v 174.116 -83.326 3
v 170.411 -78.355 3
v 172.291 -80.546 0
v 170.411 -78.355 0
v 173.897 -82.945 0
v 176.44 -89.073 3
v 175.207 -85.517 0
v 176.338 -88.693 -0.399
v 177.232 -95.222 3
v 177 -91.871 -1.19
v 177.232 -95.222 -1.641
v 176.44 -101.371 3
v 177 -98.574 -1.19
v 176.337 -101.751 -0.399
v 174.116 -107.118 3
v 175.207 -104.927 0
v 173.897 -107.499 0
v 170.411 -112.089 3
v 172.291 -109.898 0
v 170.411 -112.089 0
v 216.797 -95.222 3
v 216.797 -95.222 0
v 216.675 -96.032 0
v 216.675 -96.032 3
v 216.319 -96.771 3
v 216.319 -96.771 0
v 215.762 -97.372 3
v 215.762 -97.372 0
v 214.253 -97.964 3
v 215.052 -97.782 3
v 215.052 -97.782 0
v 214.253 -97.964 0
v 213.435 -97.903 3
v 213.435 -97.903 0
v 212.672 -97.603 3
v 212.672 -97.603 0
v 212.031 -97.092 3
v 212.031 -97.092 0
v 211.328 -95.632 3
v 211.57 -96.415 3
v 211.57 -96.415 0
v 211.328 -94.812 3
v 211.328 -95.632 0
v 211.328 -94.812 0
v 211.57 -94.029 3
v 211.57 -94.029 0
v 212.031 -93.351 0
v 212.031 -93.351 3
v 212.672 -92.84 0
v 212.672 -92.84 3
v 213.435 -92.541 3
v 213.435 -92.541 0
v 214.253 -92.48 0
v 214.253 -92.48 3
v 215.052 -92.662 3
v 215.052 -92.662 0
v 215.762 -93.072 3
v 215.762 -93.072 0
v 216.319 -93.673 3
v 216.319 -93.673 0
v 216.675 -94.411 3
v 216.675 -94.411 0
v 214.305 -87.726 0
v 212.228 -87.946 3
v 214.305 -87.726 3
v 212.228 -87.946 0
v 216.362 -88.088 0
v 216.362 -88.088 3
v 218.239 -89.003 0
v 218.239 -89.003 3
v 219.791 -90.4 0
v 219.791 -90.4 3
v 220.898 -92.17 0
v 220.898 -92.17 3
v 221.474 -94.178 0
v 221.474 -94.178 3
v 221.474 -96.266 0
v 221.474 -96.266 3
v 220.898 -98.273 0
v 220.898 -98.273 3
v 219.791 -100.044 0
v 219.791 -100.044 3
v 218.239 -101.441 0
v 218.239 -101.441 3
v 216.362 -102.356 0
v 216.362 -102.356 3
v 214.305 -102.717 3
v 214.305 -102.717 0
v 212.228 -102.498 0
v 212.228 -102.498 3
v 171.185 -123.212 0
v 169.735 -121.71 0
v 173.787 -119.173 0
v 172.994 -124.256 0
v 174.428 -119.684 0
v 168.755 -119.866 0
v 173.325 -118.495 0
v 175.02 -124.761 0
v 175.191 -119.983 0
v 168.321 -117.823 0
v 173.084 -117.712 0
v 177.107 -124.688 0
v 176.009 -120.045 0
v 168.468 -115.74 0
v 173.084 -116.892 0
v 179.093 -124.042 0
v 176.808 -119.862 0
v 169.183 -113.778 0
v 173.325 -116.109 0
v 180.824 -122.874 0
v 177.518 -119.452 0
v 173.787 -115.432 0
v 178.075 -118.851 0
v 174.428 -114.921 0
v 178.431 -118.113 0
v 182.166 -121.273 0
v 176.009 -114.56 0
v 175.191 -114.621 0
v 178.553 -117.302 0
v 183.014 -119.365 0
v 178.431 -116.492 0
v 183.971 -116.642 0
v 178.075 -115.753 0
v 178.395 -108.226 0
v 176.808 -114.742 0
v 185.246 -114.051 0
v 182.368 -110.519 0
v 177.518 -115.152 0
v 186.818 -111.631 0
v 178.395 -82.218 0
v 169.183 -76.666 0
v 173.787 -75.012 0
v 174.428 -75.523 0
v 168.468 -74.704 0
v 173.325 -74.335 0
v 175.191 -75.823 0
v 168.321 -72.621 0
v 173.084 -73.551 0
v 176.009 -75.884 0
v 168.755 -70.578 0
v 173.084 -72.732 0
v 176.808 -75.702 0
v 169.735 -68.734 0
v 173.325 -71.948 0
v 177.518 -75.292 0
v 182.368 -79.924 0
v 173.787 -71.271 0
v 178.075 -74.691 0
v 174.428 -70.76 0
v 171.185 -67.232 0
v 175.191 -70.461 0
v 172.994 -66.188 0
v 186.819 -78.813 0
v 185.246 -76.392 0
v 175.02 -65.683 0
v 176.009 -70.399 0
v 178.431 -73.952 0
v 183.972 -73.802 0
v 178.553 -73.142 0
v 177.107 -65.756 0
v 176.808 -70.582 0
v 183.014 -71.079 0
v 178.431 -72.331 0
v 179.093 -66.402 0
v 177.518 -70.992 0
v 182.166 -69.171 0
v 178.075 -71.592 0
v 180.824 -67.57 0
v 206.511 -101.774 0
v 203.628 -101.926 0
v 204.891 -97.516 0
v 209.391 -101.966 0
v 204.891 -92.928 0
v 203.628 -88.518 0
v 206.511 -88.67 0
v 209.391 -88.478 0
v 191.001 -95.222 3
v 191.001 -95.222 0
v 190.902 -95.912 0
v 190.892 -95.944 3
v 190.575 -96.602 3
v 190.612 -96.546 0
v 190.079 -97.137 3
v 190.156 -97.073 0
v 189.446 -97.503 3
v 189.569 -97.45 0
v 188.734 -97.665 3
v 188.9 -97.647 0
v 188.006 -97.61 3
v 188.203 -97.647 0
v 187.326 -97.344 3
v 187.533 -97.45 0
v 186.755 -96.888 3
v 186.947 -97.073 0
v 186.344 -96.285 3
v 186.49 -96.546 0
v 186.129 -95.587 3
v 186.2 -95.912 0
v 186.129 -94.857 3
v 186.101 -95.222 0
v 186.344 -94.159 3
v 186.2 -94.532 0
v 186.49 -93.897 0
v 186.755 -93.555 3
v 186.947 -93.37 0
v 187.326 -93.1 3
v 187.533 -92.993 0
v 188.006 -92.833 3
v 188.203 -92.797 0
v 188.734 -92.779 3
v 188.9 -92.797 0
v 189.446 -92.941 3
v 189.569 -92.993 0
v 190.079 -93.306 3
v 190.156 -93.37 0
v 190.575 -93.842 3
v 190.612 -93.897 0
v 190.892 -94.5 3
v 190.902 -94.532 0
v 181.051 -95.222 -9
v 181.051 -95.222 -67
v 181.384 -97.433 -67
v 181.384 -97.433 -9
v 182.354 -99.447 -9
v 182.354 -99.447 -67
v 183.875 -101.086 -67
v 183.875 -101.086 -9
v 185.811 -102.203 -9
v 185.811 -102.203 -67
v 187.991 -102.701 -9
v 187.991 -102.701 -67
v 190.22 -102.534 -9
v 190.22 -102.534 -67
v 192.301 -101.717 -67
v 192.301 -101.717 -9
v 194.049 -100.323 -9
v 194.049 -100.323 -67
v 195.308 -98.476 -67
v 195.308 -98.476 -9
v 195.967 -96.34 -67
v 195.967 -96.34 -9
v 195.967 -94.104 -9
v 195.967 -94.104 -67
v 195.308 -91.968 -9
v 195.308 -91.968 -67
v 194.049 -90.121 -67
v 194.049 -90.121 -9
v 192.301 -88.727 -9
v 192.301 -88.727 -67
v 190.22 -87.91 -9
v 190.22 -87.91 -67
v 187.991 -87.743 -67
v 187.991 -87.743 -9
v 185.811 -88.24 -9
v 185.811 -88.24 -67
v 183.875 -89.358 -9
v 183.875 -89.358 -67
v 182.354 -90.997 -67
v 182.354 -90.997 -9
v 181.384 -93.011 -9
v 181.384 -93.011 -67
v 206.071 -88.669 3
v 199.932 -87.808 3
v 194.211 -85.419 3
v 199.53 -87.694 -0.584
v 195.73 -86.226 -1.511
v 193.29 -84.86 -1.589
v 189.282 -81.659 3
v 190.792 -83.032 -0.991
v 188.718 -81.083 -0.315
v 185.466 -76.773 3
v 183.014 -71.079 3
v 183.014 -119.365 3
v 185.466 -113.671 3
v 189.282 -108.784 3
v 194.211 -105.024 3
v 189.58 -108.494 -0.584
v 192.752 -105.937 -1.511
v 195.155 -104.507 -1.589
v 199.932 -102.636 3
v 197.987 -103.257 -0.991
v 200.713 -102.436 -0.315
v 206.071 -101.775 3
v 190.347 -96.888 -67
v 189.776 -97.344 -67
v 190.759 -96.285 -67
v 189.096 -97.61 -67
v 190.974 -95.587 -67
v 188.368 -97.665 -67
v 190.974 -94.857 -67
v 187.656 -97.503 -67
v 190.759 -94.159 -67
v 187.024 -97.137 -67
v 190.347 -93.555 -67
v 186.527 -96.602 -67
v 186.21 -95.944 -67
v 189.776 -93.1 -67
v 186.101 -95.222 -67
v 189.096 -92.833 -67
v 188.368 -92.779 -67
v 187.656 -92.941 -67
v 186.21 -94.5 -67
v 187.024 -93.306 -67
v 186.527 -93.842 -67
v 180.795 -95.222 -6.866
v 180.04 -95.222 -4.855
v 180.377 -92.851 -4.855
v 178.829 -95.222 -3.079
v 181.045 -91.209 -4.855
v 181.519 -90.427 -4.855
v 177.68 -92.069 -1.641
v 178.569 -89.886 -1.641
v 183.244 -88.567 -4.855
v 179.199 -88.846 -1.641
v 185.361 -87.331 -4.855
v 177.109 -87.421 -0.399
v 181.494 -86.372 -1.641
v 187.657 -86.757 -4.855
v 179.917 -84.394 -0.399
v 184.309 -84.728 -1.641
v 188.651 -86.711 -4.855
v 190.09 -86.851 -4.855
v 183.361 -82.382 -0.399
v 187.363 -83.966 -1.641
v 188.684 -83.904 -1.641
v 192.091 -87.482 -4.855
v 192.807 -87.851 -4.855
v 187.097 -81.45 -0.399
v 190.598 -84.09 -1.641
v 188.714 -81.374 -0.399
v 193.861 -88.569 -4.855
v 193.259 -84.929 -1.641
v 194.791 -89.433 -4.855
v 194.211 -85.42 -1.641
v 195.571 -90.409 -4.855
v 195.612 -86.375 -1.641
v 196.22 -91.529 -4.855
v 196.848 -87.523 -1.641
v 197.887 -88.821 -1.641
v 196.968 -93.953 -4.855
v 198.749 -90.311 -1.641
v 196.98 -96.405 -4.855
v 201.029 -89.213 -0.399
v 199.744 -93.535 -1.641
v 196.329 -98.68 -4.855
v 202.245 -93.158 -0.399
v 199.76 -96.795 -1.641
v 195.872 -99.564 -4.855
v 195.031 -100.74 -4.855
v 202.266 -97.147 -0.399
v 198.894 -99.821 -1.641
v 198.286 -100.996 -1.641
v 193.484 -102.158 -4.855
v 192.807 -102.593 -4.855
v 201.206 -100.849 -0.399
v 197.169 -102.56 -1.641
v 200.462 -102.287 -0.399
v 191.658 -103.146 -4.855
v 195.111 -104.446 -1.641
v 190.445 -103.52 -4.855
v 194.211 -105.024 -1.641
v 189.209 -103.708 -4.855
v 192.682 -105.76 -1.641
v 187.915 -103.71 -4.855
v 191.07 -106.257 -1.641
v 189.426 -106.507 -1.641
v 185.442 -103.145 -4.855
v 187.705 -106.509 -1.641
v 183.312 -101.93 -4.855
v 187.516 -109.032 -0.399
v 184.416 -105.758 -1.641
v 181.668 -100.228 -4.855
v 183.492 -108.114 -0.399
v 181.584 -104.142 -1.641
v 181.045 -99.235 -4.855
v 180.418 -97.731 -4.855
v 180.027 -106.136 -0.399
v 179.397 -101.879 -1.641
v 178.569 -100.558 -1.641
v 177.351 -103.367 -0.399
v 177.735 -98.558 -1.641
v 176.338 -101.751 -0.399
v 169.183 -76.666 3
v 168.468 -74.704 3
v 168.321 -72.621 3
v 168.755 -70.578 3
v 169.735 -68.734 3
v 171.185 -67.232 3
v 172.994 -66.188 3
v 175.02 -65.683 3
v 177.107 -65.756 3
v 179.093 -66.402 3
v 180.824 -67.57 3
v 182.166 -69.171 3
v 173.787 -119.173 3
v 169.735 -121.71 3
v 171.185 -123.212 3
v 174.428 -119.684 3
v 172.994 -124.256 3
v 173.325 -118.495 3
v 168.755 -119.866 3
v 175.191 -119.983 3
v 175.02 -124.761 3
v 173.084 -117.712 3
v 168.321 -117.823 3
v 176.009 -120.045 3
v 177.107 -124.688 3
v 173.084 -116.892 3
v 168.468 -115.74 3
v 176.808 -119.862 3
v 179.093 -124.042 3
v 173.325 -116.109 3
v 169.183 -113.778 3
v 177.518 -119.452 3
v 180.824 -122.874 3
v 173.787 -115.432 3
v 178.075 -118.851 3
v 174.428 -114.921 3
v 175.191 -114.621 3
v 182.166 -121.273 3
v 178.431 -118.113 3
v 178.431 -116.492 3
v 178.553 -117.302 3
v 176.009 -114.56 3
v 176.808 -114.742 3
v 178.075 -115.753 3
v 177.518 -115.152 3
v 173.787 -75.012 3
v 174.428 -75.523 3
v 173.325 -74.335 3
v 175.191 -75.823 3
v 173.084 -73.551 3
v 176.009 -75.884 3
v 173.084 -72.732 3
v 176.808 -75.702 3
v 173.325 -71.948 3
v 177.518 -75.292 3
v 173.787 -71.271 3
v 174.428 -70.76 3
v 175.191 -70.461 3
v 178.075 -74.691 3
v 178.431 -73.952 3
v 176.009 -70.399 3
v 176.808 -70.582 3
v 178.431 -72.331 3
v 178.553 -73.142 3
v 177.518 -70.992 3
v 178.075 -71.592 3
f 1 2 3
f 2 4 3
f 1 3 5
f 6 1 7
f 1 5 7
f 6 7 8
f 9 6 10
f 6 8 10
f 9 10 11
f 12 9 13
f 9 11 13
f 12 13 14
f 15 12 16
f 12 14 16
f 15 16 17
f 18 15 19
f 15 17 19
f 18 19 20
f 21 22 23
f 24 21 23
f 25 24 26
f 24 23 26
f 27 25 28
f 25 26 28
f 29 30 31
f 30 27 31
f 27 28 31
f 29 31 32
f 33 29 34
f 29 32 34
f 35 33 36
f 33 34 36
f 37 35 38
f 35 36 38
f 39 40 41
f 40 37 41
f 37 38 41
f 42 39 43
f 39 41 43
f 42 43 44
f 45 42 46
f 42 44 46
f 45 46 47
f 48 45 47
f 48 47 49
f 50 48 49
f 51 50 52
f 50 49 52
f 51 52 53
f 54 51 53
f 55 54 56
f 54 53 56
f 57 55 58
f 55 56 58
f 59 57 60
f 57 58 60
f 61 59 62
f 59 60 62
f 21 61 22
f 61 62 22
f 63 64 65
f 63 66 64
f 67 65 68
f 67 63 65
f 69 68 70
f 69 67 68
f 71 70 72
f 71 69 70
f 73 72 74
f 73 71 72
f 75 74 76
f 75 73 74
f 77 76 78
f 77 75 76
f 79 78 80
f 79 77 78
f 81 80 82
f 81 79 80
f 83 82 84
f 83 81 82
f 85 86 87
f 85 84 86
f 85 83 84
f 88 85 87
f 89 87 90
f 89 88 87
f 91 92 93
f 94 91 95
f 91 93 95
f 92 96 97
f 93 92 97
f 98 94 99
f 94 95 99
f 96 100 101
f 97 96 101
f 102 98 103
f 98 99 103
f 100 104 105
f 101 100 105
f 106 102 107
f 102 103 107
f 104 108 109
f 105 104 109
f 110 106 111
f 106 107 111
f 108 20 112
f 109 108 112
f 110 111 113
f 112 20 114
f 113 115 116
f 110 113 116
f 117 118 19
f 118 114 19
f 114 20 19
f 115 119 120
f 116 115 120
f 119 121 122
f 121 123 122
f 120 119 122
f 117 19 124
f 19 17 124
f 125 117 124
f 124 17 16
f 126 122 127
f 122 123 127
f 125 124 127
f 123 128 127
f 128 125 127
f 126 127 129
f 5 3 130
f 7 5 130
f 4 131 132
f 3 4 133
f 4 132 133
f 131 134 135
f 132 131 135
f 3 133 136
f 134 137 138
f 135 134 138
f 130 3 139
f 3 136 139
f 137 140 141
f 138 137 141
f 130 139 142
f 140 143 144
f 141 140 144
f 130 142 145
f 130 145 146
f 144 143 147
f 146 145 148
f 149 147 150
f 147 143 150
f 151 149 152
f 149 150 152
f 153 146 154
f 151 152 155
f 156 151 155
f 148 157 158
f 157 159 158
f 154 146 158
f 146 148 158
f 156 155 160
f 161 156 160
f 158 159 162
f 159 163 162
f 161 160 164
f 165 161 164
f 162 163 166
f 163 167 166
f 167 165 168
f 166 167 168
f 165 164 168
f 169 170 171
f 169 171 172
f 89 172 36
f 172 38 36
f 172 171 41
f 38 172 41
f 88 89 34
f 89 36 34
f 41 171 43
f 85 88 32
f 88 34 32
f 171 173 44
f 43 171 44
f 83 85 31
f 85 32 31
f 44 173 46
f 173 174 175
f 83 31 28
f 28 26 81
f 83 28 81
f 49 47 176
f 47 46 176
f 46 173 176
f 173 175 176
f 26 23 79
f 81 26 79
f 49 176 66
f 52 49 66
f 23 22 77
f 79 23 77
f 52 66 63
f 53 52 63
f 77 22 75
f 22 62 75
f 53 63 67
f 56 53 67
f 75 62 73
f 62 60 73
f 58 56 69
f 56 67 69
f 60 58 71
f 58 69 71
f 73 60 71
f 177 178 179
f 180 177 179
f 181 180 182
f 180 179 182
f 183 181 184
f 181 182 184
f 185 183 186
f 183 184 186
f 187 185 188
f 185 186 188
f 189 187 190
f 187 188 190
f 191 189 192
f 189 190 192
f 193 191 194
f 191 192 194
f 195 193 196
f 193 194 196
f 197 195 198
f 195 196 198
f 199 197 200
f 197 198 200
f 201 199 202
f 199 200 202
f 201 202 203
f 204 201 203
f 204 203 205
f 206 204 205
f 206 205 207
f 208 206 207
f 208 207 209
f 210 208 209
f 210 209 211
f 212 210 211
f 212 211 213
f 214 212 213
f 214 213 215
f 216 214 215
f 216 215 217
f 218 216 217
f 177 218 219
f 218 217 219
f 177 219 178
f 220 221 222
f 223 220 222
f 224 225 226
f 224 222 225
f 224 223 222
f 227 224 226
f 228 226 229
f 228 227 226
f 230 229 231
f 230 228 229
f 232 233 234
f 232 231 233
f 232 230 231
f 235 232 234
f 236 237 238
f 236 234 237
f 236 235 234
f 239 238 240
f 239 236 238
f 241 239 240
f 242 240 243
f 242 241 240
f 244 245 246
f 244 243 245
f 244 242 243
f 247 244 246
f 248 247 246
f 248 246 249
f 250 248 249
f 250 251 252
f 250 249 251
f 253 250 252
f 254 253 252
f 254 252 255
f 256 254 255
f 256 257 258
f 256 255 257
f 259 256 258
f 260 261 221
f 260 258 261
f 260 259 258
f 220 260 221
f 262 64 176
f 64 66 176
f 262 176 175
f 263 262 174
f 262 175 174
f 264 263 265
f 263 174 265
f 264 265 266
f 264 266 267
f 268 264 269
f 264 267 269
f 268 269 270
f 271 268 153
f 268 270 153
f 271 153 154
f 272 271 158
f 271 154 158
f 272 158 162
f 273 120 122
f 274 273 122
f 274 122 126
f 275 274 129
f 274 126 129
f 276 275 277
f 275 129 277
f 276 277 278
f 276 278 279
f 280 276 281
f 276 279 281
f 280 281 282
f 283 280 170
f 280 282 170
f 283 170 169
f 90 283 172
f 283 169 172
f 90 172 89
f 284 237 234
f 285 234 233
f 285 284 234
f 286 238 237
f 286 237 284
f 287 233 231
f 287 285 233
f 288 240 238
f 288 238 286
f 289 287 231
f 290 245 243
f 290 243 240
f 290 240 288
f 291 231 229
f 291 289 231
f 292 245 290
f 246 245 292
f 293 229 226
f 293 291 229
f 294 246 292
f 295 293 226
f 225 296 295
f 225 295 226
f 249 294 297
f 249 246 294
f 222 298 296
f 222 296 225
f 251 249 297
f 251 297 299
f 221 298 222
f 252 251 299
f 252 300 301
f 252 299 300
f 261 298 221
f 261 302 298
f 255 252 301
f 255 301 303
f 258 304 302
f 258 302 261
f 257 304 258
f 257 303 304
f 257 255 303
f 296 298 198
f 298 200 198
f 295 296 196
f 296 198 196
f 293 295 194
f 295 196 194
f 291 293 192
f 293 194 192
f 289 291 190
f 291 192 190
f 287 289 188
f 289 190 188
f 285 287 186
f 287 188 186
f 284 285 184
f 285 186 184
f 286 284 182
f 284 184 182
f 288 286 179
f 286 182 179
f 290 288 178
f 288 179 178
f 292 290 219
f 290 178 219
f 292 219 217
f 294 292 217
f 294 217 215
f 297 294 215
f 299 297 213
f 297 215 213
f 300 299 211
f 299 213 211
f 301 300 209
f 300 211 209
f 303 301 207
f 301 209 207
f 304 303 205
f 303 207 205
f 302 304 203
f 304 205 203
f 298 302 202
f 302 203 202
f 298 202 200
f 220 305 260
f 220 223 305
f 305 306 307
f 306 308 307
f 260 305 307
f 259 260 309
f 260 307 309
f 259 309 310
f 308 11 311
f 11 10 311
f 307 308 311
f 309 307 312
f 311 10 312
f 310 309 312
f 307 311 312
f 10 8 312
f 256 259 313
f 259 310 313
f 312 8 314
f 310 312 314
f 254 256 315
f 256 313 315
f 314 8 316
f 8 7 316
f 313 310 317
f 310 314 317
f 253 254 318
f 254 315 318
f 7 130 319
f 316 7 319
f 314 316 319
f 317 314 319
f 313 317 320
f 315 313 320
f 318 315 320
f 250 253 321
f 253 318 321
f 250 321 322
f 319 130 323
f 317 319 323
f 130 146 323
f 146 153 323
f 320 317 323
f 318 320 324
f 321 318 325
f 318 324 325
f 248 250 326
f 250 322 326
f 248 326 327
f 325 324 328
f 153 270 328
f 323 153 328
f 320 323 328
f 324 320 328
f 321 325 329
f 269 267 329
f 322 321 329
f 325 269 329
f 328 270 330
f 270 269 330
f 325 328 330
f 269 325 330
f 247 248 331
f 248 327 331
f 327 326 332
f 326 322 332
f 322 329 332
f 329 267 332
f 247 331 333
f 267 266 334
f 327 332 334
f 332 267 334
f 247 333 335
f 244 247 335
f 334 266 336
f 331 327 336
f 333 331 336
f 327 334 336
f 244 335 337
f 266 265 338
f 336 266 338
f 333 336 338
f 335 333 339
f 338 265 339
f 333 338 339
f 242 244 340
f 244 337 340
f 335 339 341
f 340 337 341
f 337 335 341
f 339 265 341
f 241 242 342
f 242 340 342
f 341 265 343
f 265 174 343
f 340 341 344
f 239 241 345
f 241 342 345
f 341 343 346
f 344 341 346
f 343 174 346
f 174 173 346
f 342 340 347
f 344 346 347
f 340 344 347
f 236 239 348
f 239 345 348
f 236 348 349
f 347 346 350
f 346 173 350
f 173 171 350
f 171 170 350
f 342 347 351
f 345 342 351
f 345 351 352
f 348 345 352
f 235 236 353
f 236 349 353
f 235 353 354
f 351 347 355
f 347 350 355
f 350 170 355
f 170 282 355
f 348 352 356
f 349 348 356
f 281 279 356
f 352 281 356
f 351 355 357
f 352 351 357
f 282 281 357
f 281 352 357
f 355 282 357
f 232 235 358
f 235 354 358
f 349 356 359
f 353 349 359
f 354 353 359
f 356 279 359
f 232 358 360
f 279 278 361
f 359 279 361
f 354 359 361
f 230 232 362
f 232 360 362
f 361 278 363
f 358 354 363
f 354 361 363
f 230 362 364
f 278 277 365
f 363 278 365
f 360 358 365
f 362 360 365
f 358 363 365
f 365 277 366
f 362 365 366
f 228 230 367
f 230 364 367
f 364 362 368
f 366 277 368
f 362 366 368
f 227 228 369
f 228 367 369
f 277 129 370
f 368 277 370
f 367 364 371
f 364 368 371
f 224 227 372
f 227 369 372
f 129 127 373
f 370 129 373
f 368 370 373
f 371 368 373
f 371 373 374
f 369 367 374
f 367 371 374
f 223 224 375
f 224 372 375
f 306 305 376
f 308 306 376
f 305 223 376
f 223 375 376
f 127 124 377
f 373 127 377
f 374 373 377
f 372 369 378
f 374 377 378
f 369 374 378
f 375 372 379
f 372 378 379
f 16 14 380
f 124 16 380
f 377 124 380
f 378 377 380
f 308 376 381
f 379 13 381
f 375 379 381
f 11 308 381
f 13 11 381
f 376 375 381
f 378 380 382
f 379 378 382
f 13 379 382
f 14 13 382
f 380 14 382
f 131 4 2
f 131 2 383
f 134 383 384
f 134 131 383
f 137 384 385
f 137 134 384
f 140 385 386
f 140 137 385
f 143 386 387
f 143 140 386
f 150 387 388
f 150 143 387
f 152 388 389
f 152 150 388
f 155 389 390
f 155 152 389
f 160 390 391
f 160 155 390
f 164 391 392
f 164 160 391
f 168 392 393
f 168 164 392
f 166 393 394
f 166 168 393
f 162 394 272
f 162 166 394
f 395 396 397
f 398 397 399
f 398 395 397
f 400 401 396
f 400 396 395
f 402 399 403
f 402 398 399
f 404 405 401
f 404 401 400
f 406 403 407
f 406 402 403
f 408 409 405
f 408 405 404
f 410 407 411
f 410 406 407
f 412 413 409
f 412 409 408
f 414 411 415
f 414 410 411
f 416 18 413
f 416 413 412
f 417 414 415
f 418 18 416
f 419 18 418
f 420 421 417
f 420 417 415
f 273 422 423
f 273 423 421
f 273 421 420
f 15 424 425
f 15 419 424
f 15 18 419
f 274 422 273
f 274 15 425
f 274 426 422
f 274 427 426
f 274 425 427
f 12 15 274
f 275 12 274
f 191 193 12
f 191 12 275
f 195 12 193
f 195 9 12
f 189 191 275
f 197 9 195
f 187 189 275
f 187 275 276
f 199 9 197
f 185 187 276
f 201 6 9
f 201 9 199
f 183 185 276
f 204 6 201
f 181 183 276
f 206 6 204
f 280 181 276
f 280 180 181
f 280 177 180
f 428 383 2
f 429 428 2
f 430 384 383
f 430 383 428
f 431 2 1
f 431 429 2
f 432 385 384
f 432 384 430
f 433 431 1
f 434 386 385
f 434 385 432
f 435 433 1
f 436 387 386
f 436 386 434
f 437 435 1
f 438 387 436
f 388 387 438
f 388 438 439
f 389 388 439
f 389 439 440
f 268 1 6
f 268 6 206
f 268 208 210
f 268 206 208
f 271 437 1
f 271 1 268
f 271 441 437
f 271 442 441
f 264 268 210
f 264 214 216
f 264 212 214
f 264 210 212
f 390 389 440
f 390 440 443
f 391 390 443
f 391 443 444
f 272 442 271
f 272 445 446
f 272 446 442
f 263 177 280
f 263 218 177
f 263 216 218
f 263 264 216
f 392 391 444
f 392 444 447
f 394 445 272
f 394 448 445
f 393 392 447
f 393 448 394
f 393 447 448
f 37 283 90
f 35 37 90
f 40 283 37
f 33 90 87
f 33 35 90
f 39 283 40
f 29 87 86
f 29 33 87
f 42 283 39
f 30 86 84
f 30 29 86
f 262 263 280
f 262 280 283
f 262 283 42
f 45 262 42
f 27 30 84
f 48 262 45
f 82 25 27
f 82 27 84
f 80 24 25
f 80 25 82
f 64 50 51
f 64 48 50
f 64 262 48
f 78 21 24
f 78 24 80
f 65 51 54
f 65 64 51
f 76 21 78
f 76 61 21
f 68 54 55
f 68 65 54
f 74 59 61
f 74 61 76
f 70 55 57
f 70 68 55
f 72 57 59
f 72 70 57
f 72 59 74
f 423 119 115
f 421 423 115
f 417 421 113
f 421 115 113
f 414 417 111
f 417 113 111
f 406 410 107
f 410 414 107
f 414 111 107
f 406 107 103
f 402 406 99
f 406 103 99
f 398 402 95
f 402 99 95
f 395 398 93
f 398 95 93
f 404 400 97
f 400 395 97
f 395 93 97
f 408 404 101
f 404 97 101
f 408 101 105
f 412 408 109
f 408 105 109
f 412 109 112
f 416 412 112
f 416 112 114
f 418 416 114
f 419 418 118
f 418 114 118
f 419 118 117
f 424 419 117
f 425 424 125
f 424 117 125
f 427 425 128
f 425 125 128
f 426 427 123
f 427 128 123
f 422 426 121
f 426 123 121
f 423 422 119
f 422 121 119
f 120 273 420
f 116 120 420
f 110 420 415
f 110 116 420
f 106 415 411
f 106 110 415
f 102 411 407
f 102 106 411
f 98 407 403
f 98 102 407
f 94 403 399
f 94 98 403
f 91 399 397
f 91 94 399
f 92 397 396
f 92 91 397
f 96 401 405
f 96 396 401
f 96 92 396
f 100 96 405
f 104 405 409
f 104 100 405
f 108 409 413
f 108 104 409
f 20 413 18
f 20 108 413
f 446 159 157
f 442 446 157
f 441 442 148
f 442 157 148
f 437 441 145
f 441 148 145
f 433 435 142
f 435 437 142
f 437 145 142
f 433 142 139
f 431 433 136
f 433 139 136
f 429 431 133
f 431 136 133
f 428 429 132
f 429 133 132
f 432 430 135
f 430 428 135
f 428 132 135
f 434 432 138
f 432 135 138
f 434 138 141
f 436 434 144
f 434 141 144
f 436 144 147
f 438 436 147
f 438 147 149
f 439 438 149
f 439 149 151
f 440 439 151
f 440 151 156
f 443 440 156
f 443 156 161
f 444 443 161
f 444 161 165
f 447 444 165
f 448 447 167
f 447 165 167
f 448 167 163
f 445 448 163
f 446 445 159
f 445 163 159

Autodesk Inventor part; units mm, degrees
ref_plane "YZ Plane" through (0, 0, 0) normal (1, 0, 0) x (0, 1, 0)
ref_plane "XZ Plane" through (0, 0, 0) normal (0, 1, 0) x (-1, 0, 0)
ref_plane "XY Plane" through (0, 0, 0) normal (0, 0, 1) x (1, 0, 0)
sketch "Block1" plane through (0, 0, 0) normal (0, 0, 1) x (1, 0, 0)
  arc A0 (51.9869, 17.514) -> (51.7404, 14.6963) centre (53.2724, 15.9819) ccw
  arc A1 (68.7213, 13.3186) -> (65.2964, 25.2266) centre (0, 0) ccw
  arc A2 (61.6287, -6.0233) -> (58.811, -6.2699) centre (60.3431, -7.5554) ccw
  arc A3 (61.6287, -6.0233) -> (58.811, -6.2699) centre (60.3431, -7.5554) ccw
  line L0 (61.6287, -6.0233) -> (68.0434, -11.4059)
  line L1 (51.7404, -14.6963) -> (58.811, -6.2699)
  arc A4 (68.7213, -13.3186) -> (68.0434, -11.4059) centre (66.7578, -12.938) ccw
  arc A5 (68.7213, -13.3186) -> (68.0434, -11.4059) centre (66.7578, -12.938) ccw
  arc A6 (51.7404, -14.6963) -> (51.9869, -17.514) centre (53.2724, -15.9819) ccw
  line L2 (62.1452, -26.0379) -> (51.9869, -17.514)
  arc A7 (65.2964, -25.2266) -> (68.7213, -13.3186) centre (0, 0) ccw
  line L3 (68.0434, -11.4059) -> (61.6287, -6.0233)
  arc A8 (62.1452, -26.0379) -> (65.2964, -25.2266) centre (63.4308, -24.5058) ccw
  arc A9 (62.1452, -26.0379) -> (65.2964, -25.2266) centre (63.4308, -24.5058) ccw
  line L4 (36.4337, -56.6797) -> (26.2754, -48.1558)
  line L5 (26.2754, -48.1558) -> (36.4337, -56.6797)
  arc A10 (25.0495, -65.3645) -> (36.1819, -59.9239) centre (0, 0) ccw
  arc A11 (36.1819, -59.9239) -> (36.4337, -56.6797) centre (35.1481, -58.2118) ccw
  arc A12 (36.1819, -59.9239) -> (36.4337, -56.6797) centre (35.1481, -58.2118) ccw
  arc A13 (36.1819, -59.9239) -> (65.2964, -25.2266) centre (0, 0) ccw
  arc A14 (-51.082, -35) -> (-49.082, -33) centre (-51.082, -33) ccw
  line L6 (-49.082, -33) -> (-49.082, -22)
  arc A15 (-66.2353, -22.6471) -> (-61.2046, -33.9706) centre (0, 0) ccw
  line L7 (-49.082, -22) -> (-49.082, -33)
  arc A16 (-51.082, -35) -> (-49.082, -33) centre (-51.082, -33) ccw
  line L8 (-59.4559, -35) -> (-51.082, -35)
  line L9 (-51.082, -35) -> (-59.4559, -35)
  arc A17 (-61.2046, -33.9706) -> (-59.4559, -35) centre (-59.4559, -33) ccw
  arc A18 (-61.2046, -33.9706) -> (-59.4559, -35) centre (-59.4559, -33) ccw
  arc A19 (-49.082, 33) -> (-51.082, 35) centre (-51.082, 33) ccw
  line L10 (-29.1457, 1.2495) -> (-29.1457, -3.1905)
  circle A20 centre (-12.7481, 22.0803) radius 2.75
  arc A21 (25.0495, 65.3645) -> (-61.2046, 33.9706) centre (0, 0) ccw
  circle A22 centre (25.4961, 0) radius 2.75
  line L11 (22.9771, 23.4574) -> (25.8311, 20.0561)
  arc A23 (23.4577, 48.4023) -> (26.2754, 48.1558) centre (24.9898, 49.6879) ccw
  arc A24 (23.4577, 48.4023) -> (26.2754, 48.1558) centre (24.9898, 49.6879) ccw
  arc A25 (16.6335, 59.6465) -> (16.387, 56.8288) centre (17.9191, 58.1144) ccw
  line L12 (16.387, 56.8288) -> (23.4577, 48.4023)
  line L13 (23.4577, 48.4023) -> (16.387, 56.8288)
  arc A26 (-49.082, -22) -> (-51.082, -20) centre (-51.082, -22) ccw
  line L14 (-51.082, -20) -> (-64.3428, -20)
  arc A27 (-64.3428, -20) -> (-66.2353, -22.6471) centre (-64.3428, -22) ccw
  line L15 (-51.082, 20) -> (-64.3428, 20)
  arc A28 (-51.082, 20) -> (-49.082, 22) centre (-51.082, 22) ccw
  arc A29 (-66.2353, 22.6471) -> (-64.3428, 20) centre (-64.3428, 22) ccw
  arc A30 (-66.2353, 22.6471) -> (-64.3428, 20) centre (-64.3428, 22) ccw
  arc A31 (-49.082, -22) -> (-51.082, -20) centre (-51.082, -22) ccw
  line L16 (-64.3428, -20) -> (-51.082, -20)
  arc A32 (-66.2353, 22.6471) -> (-66.2353, -22.6471) centre (0, 0) ccw
  arc A33 (-64.3428, -20) -> (-66.2353, -22.6471) centre (-64.3428, -22) ccw
  line L17 (-64.3428, 20) -> (-51.082, 20)
  line L18 (-49.082, 22) -> (-49.082, 33)
  line L19 (-51.082, 35) -> (-59.4559, 35)
  arc A34 (-59.4559, 35) -> (-61.2046, 33.9706) centre (-59.4559, 33) ccw
  arc A35 (-51.082, 20) -> (-49.082, 22) centre (-51.082, 22) ccw
  line L20 (51.9869, -17.514) -> (62.1452, -26.0379)
  arc A36 (51.7404, -14.6963) -> (51.9869, -17.514) centre (53.2724, -15.9819) ccw
  line L21 (58.811, -6.2699) -> (51.7404, -14.6963)
  line L22 (62.1452, 26.0379) -> (51.9869, 17.514)
  arc A37 (65.2964, 25.2266) -> (62.1452, 26.0379) centre (63.4308, 24.5058) ccw
  arc A38 (65.2964, 25.2266) -> (62.1452, 26.0379) centre (63.4308, 24.5058) ccw
  line L23 (26.2754, 48.1558) -> (36.4337, 56.6797)
  line L24 (36.4337, 56.6797) -> (26.2754, 48.1558)
  arc A39 (36.1819, 59.9239) -> (25.0495, 65.3645) centre (0, 0) ccw
  arc A40 (36.4337, 56.6797) -> (36.1819, 59.9239) centre (35.1481, 58.2118) ccw
  arc A41 (36.4337, 56.6797) -> (36.1819, 59.9239) centre (35.1481, 58.2118) ccw
  arc A42 (65.2964, 25.2266) -> (36.1819, 59.9239) centre (0, 0) ccw
  line L25 (51.9869, 17.514) -> (62.1452, 26.0379)
  arc A43 (-61.2046, 33.9706) -> (-66.2353, 22.6471) centre (0, 0) ccw
  line L26 (-49.082, 33) -> (-49.082, 22)
  arc A44 (-59.4559, 35) -> (-61.2046, 33.9706) centre (-59.4559, 33) ccw
  line L27 (-59.4559, 35) -> (-51.082, 35)
  arc A45 (-49.082, 33) -> (-51.082, 35) centre (-51.082, 33) ccw
  arc A46 (16.387, -56.8288) -> (16.6335, -59.6465) centre (17.9191, -58.1144) ccw
  line L28 (16.6335, -59.6465) -> (23.0483, -65.029)
  arc A47 (23.0483, -65.029) -> (25.0495, -65.3645) centre (24.3338, -63.497) ccw
  arc A48 (26.2754, -48.1558) -> (23.4577, -48.4023) centre (24.9898, -49.6879) ccw
  line L29 (23.4577, -48.4023) -> (16.387, -56.8288)
  arc A49 (-61.2046, -33.9706) -> (25.0495, -65.3645) centre (0, 0) ccw
  arc A50 (16.387, -56.8288) -> (16.6335, -59.6465) centre (17.9191, -58.1144) ccw
  line L30 (23.0483, -65.029) -> (16.6335, -59.6465)
  arc A51 (23.0483, -65.029) -> (25.0495, -65.3645) centre (24.3338, -63.497) ccw
  line L31 (16.387, -56.8288) -> (23.4577, -48.4023)
  arc A52 (26.2754, -48.1558) -> (23.4577, -48.4023) centre (24.9898, -49.6879) ccw
  circle A53 centre (-12.7481, -22.0803) radius 2.75
  arc A54 (16.6335, 59.6465) -> (16.387, 56.8288) centre (17.9191, 58.1144) ccw
  line L32 (23.0483, 65.029) -> (16.6335, 59.6465)
  line L33 (16.6335, 59.6465) -> (23.0483, 65.029)
  arc A55 (25.0495, 65.3645) -> (23.0483, 65.029) centre (24.3338, 63.497) ccw
  arc A56 (25.0495, 65.3645) -> (23.0483, 65.029) centre (24.3338, 63.497) ccw
  arc A57 (58.811, 6.2699) -> (61.6287, 6.0233) centre (60.3431, 7.5554) ccw
  line L34 (61.6287, 6.0233) -> (68.0434, 11.4059)
  arc A58 (68.7213, -13.3186) -> (68.7213, 13.3186) centre (0, 0) ccw
  arc A59 (58.811, 6.2699) -> (61.6287, 6.0233) centre (60.3431, 7.5554) ccw
  line L35 (68.0434, 11.4059) -> (61.6287, 6.0233)
  arc A60 (68.0434, 11.4059) -> (68.7213, 13.3186) centre (66.7578, 12.938) ccw
  arc A61 (68.0434, 11.4059) -> (68.7213, 13.3186) centre (66.7578, 12.938) ccw
  line L36 (51.7404, 14.6963) -> (58.811, 6.2699)
  arc A62 (51.9869, 17.514) -> (51.7404, 14.6963) centre (53.2724, 15.9819) ccw
  line L37 (58.811, 6.2699) -> (51.7404, 14.6963)
  point P0 (9.241, 0.2297)
sketch "Block2" plane through (0, 0, 0) normal (0, 0, 1) x (1, 0, 0)
  line L0 (151.5687, -148.5392) -> (143.1948, -148.5392)
  arc A0 (141.4461, -147.5098) -> (143.1948, -148.5392) centre (143.1948, -146.5392) ccw
  line L1 (254.391, -128.2355) -> (261.4617, -119.809)
  arc A1 (254.391, -128.2355) -> (254.6376, -131.0532) centre (255.9231, -129.5211) ccw
  line L2 (264.7959, -139.5771) -> (254.6376, -131.0532)
  arc A2 (264.7959, -139.5771) -> (267.9471, -138.7657) centre (266.0815, -138.045) ccw
  circle A3 centre (228.1468, -113.5392) radius 2.75
  arc A4 (228.9261, -161.695) -> (226.1084, -161.9415) centre (227.6405, -163.227) ccw
  line L3 (228.9261, -161.695) -> (239.0844, -170.2188)
  arc A5 (238.8326, -173.463) -> (267.9471, -138.7657) centre (202.6507, -113.5392) ccw
  arc A6 (238.8326, -173.463) -> (239.0844, -170.2188) centre (237.7988, -171.7509) ccw
  circle A7 centre (189.9026, -135.6195) radius 2.75
  line L4 (153.5687, -135.5392) -> (153.5687, -146.5392)
  line L5 (158.5687, -148.5392) -> (158.5687, -139.2292)
  line L6 (158.5687, -148.5392) -> (148.1948, -148.5392)
  arc A8 (151.5687, -148.5392) -> (153.5687, -146.5392) centre (151.5687, -146.5392) ccw
  line L7 (174.6507, -139.2292) -> (174.6507, -152.5392)
  line L8 (174.6507, -152.5392) -> (148.1948, -152.5392)
  line L9 (179.6507, -152.5392) -> (179.6507, -139.2292)
  line L10 (148.1948, -152.5392) -> (148.1948, -148.5392)
  arc A9 (143.1948, -78.5392) -> (141.4461, -79.5686) centre (143.1948, -80.5392) ccw
  arc A10 (153.5687, -135.5392) -> (151.5687, -133.5392) centre (151.5687, -135.5392) ccw
  line L11 (138.3079, -133.5392) -> (151.5687, -133.5392)
  arc A11 (138.3079, -133.5392) -> (136.4154, -136.1862) centre (138.3079, -135.5392) ccw
  line L12 (151.5687, -93.5392) -> (138.3079, -93.5392)
  arc A12 (136.4154, -90.8921) -> (136.4154, -136.1862) centre (202.6507, -113.5392) ccw
  arc A13 (136.4154, -90.8921) -> (138.3079, -93.5392) centre (138.3079, -91.5392) ccw
  arc A14 (151.5687, -93.5392) -> (153.5687, -91.5392) centre (151.5687, -91.5392) ccw
  line L13 (143.1948, -78.5392) -> (151.5687, -78.5392)
  arc A15 (153.5687, -80.5392) -> (151.5687, -78.5392) centre (151.5687, -80.5392) ccw
  line L14 (153.5687, -80.5392) -> (153.5687, -91.5392)
  line L15 (158.5687, -139.2292) -> (174.6507, -139.2292)
  arc A16 (254.6376, -96.0252) -> (254.391, -98.8428) centre (255.9231, -97.5572) ccw
  line L16 (254.6376, -96.0252) -> (264.7959, -87.5013)
  arc A17 (267.9471, -88.3126) -> (264.7959, -87.5013) centre (266.0815, -89.0334) ccw
  line L17 (219.9377, -94.8563) -> (222.7917, -98.2575)
  arc A18 (226.1084, -65.1369) -> (228.9261, -65.3834) centre (227.6405, -63.8513) ccw
  arc A19 (267.9471, -88.3126) -> (238.8326, -53.6153) centre (202.6507, -113.5392) ccw
  arc A20 (239.0844, -56.8595) -> (238.8326, -53.6153) centre (237.7988, -55.3274) ccw
  line L18 (239.0844, -56.8595) -> (228.9261, -65.3834)
  line L19 (226.1084, -65.1369) -> (219.0377, -56.7104)
  arc A21 (264.2794, -119.5625) -> (261.4617, -119.809) centre (262.9938, -121.0946) ccw
  line L20 (264.2794, -119.5625) -> (270.6941, -124.9451)
  arc A22 (271.372, -126.8577) -> (270.6941, -124.9451) centre (269.4085, -126.4772) ccw
  arc A23 (261.4617, -107.2693) -> (264.2794, -107.5158) centre (262.9938, -105.9837) ccw
  arc A24 (271.372, -126.8577) -> (271.372, -100.2206) centre (202.6507, -113.5392) ccw
  line L21 (261.4617, -107.2693) -> (254.391, -98.8428)
  line L22 (270.6941, -102.1332) -> (264.2794, -107.5158)
  arc A25 (270.6941, -102.1332) -> (271.372, -100.2206) centre (269.4085, -100.6011) ccw
  circle A26 centre (189.9026, -91.4589) radius 2.75
  line L23 (188.3917, -112.2896) -> (188.3917, -116.7296)
  line L24 (219.2842, -53.8927) -> (225.699, -48.5101)
  arc A27 (227.7002, -48.1746) -> (225.699, -48.5101) centre (226.9845, -50.0422) ccw
  arc A28 (227.7002, -48.1746) -> (141.4461, -79.5686) centre (202.6507, -113.5392) ccw
  arc A29 (219.2842, -53.8927) -> (219.0377, -56.7104) centre (220.5698, -55.4248) ccw
  line L25 (219.2976, -48.6599) -> (221.8687, -51.7241)
  line L26 (213.9219, -58.3922) -> (221.8687, -51.7241)
  line L27 (213.9219, -58.3922) -> (219.9063, -65.5241)
  line L28 (219.9063, -65.5241) -> (207.5867, -75.8614)
  line L29 (213.4899, -70.908) -> (204.9344, -60.712)
  line L30 (199.0312, -65.6654) -> (219.2976, -48.6599)
  line L31 (207.5867, -75.8614) -> (199.0312, -65.6654)
  line L32 (195.201, -68.8793) -> (203.7565, -79.0754)
  arc A30 (141.4461, -147.5098) -> (227.7002, -178.9037) centre (202.6507, -113.5392) ccw
  line L33 (207.5867, -151.2169) -> (199.0312, -161.413)
  line L34 (213.4899, -156.1703) -> (204.9344, -166.3663)
  line L35 (219.9063, -161.5542) -> (207.5867, -151.2169)
  line L36 (213.9219, -168.6861) -> (219.9063, -161.5542)
  arc A31 (219.0377, -170.368) -> (219.2842, -173.1856) centre (220.5698, -171.6535) ccw
  line L37 (199.0312, -161.413) -> (219.2976, -178.4185)
  line L38 (213.9219, -168.6861) -> (221.8687, -175.3543)
  line L39 (219.2976, -178.4185) -> (221.8687, -175.3543)
  line L40 (219.0377, -170.368) -> (226.1084, -161.9415)
  line L41 (225.699, -178.5682) -> (219.2842, -173.1856)
  arc A32 (225.699, -178.5682) -> (227.7002, -178.9037) centre (226.9845, -177.0361) ccw
  line L42 (195.201, -158.199) -> (203.7565, -148.003)
  point P0 (207.2921, -116.2358)
sketch "Sketch1" plane through (0, 0, 0) normal (0, 0, 1) x (1, 0, 0)
  circle A0 centre (188.5512, -95.2219) radius 70
  circle A1 centre (214.0473, -95.2219) radius 2.75
  circle A2 centre (175.8031, -117.3022) radius 2.75
  circle A3 centre (175.8031, -73.1416) radius 2.75
  line L0 (205.1847, -35.5754) -> (211.5995, -30.1928)
  arc A4 (213.6007, -29.8573) -> (211.5995, -30.1928) centre (212.885, -31.7249) ccw
  arc A5 (213.6007, -29.8573) -> (127.3466, -61.2513) centre (188.5512, -95.2219) ccw
  arc A6 (129.0953, -60.2219) -> (127.3466, -61.2513) centre (129.0953, -62.2219) ccw
  line L1 (129.0953, -60.2219) -> (137.4691, -60.2219)
  arc A7 (139.4691, -62.2219) -> (137.4691, -60.2219) centre (137.4691, -62.2219) ccw
  line L2 (139.4691, -62.2219) -> (139.4691, -73.2219)
  arc A8 (137.4691, -75.2219) -> (139.4691, -73.2219) centre (137.4691, -73.2219) ccw
  line L3 (137.4691, -75.2219) -> (124.2084, -75.2219)
  arc A9 (122.3159, -72.5748) -> (124.2084, -75.2219) centre (124.2084, -73.2219) ccw
  arc A10 (122.3159, -72.5748) -> (122.3159, -117.8689) centre (188.5512, -95.2219) ccw
  arc A11 (124.2084, -115.2219) -> (122.3159, -117.8689) centre (124.2084, -117.2219) ccw
  line L4 (124.2084, -115.2219) -> (137.4691, -115.2219)
  arc A12 (139.4691, -117.2219) -> (137.4691, -115.2219) centre (137.4691, -117.2219) ccw
  line L5 (139.4691, -117.2219) -> (139.4691, -128.2219)
  arc A13 (137.4691, -130.2219) -> (139.4691, -128.2219) centre (137.4691, -128.2219) ccw
  line L6 (137.4691, -130.2219) -> (129.0953, -130.2219)
  arc A14 (127.3466, -129.1925) -> (129.0953, -130.2219) centre (129.0953, -128.2219) ccw
  arc A15 (127.3466, -129.1925) -> (213.6007, -160.5864) centre (188.5512, -95.2219) ccw
  arc A16 (211.5995, -160.2509) -> (213.6007, -160.5864) centre (212.885, -158.7188) ccw
  line L7 (211.5995, -160.2509) -> (205.1847, -154.8683)
  arc A17 (204.9382, -152.0507) -> (205.1847, -154.8683) centre (206.4703, -153.3362) ccw
  line L8 (204.9382, -152.0507) -> (212.0089, -143.6242)
  arc A18 (214.8265, -143.3777) -> (212.0089, -143.6242) centre (213.541, -144.9097) ccw
  line L9 (214.8265, -143.3777) -> (224.9849, -151.9015)
  arc A19 (224.7331, -155.1457) -> (224.9849, -151.9015) centre (223.6993, -153.4336) ccw
  arc A20 (224.7331, -155.1457) -> (253.8476, -120.4484) centre (188.5512, -95.2219) ccw
  arc A21 (250.6964, -121.2598) -> (253.8476, -120.4484) centre (251.982, -119.7277) ccw
  line L10 (250.6964, -121.2598) -> (240.5381, -112.7359)
  arc A22 (240.2915, -109.9182) -> (240.5381, -112.7359) centre (241.8236, -111.2038) ccw
  line L11 (240.2915, -109.9182) -> (247.3622, -101.4917)
  arc A23 (250.1799, -101.2452) -> (247.3622, -101.4917) centre (248.8943, -102.7773) ccw
  line L12 (250.1799, -101.2452) -> (256.5946, -106.6278)
  arc A24 (257.2725, -108.5404) -> (256.5946, -106.6278) centre (255.309, -108.1599) ccw
  arc A25 (257.2725, -108.5404) -> (257.2725, -81.9033) centre (188.5512, -95.2219) ccw
  arc A26 (256.5946, -83.8159) -> (257.2725, -81.9033) centre (255.309, -82.2838) ccw
  line L13 (256.5946, -83.8159) -> (250.1799, -89.1985)
  arc A27 (247.3622, -88.952) -> (250.1799, -89.1985) centre (248.8943, -87.6664) ccw
  line L14 (247.3622, -88.952) -> (240.2915, -80.5255)
  arc A28 (240.5381, -77.7079) -> (240.2915, -80.5255) centre (241.8236, -79.2399) ccw
  line L15 (240.5381, -77.7079) -> (250.6964, -69.184)
  arc A29 (253.8476, -69.9953) -> (250.6964, -69.184) centre (251.982, -70.7161) ccw
  arc A30 (253.8476, -69.9953) -> (224.7331, -35.298) centre (188.5512, -95.2219) ccw
  arc A31 (224.9849, -38.5422) -> (224.7331, -35.298) centre (223.6993, -37.0101) ccw
  line L16 (224.9849, -38.5422) -> (214.8265, -47.0661)
  arc A32 (212.0089, -46.8196) -> (214.8265, -47.0661) centre (213.541, -45.534) ccw
  line L17 (212.0089, -46.8196) -> (204.9382, -38.3931)
  arc A33 (205.1847, -35.5754) -> (204.9382, -38.3931) centre (206.4703, -37.1075) ccw
  line L18 (181.1015, -50.562) -> (189.657, -60.7581)
  line L19 (199.3904, -52.5907) -> (190.8349, -42.3947)
  line L20 (193.4872, -57.5441) -> (184.9317, -47.3481)
  line L21 (205.8068, -47.2068) -> (193.4872, -57.5441)
  line L22 (199.8224, -40.0749) -> (205.8068, -47.2068)
  line L23 (199.8224, -40.0749) -> (207.7692, -33.4068)
  line L24 (205.1981, -30.3426) -> (207.7692, -33.4068)
  line L25 (184.9317, -47.3481) -> (205.1981, -30.3426)
  line L26 (160.5512, -120.9119) -> (160.5512, -134.2219)
  line L27 (144.4691, -120.9119) -> (160.5512, -120.9119)
  line L28 (144.4691, -130.2219) -> (144.4691, -120.9119)
  line L29 (144.4691, -130.2219) -> (134.0953, -130.2219)
  line L30 (134.0953, -134.2219) -> (134.0953, -130.2219)
  line L31 (160.5512, -134.2219) -> (134.0953, -134.2219)
  line L32 (199.3904, -137.853) -> (190.8349, -148.049)
  line L33 (193.4872, -132.8996) -> (184.9317, -143.0956)
  line L34 (184.9317, -143.0956) -> (205.1981, -160.1012)
  line L35 (205.1981, -160.1012) -> (207.7692, -157.037)
  line L36 (199.8224, -150.3688) -> (207.7692, -157.037)
  line L37 (199.8224, -150.3688) -> (205.8068, -143.2369)
  line L38 (205.8068, -143.2369) -> (193.4872, -132.8996)
  line L39 (181.1015, -139.8817) -> (189.657, -129.6857)
  line L40 (165.5512, -134.2219) -> (165.5512, -120.9119)
  line L41 (205.8382, -76.539) -> (208.6922, -79.9402)
  line L42 (174.2922, -93.9723) -> (174.2922, -98.4123)
  circle A34 centre (175.8031, -73.1416) radius 7.5
  circle A35 centre (214.0473, -95.2219) radius 7.5
  circle A36 centre (175.8031, -117.3022) radius 7.5
  arc A37 (170.4114, -112.0888) -> (170.4114, -78.355) centre (152.9677, -95.2219) ccw
  circle A38 centre (188.5512, -95.2219) radius 11.3188
  arc A39 (212.2282, -102.4979) -> (183.0139, -119.3648) centre (206.3429, -126.0381) ccw
  arc A40 (183.0139, -71.0789) -> (212.2282, -87.9458) centre (206.3429, -64.4056) ccw
  circle A41 centre (188.5512, -95.2219) radius 2.45
  point P0 (183.0139, -119.3648)
  point P1 (212.2282, -87.9458)
  point P2 (183.0139, -71.0789)
  dimension "d0" = 15
  dimension "d2" = 15
  dimension "d1" = 15
  dimension "d5" = 360
  dimension "d12" = 4.9
extrude "Extrusion1" add sketch "Sketch1" along normal blind 3 contours A34 | A34 A40 A38 A37 | A40 A35 A39 A38 | A38 | A38 A39 A36 A37 | A35 | A36
sketch "Sketch2" plane through (0, 0, 0) normal (0, 0, -1) x (-1, 0, 0)
  arc A0 (-183.0139, -119.3648) -> (-212.2282, -102.4979) centre (-206.3429, -126.0381) ccw projected
  arc A1 (-183.0139, -119.3648) -> (-170.4114, -112.0888) centre (-175.8031, -117.3022) ccw projected
  arc A2 (-170.4114, -78.355) -> (-170.4114, -112.0888) centre (-152.9677, -95.2219) ccw projected
  arc A3 (-170.4114, -78.355) -> (-183.0139, -71.0789) centre (-175.8031, -73.1416) ccw projected
  arc A4 (-212.2282, -87.9458) -> (-183.0139, -71.0789) centre (-206.3429, -64.4056) ccw projected
  arc A5 (-212.2282, -87.9458) -> (-212.2282, -102.4979) centre (-214.0473, -95.2219) ccw projected
  circle A6 centre (-214.0473, -95.2219) radius 2.75 projected
  circle A7 centre (-175.8031, -73.1416) radius 2.75 projected
  circle A8 centre (-188.5512, -95.2219) radius 2.45 projected
  circle A9 centre (-175.8031, -117.3022) radius 2.75 projected
  circle A10 centre (-188.5512, -95.2219) radius 7.5
  point P0 (0, 0)
  dimension "d9" = 15
extrude "Extrusion2" add sketch "Sketch2" along normal blind 67 contours A10
fillet "Fillet1" radius 9 1 edges at (196.0512, -95.2219, 0)
properties part number "LED Tower_3DPrint"
